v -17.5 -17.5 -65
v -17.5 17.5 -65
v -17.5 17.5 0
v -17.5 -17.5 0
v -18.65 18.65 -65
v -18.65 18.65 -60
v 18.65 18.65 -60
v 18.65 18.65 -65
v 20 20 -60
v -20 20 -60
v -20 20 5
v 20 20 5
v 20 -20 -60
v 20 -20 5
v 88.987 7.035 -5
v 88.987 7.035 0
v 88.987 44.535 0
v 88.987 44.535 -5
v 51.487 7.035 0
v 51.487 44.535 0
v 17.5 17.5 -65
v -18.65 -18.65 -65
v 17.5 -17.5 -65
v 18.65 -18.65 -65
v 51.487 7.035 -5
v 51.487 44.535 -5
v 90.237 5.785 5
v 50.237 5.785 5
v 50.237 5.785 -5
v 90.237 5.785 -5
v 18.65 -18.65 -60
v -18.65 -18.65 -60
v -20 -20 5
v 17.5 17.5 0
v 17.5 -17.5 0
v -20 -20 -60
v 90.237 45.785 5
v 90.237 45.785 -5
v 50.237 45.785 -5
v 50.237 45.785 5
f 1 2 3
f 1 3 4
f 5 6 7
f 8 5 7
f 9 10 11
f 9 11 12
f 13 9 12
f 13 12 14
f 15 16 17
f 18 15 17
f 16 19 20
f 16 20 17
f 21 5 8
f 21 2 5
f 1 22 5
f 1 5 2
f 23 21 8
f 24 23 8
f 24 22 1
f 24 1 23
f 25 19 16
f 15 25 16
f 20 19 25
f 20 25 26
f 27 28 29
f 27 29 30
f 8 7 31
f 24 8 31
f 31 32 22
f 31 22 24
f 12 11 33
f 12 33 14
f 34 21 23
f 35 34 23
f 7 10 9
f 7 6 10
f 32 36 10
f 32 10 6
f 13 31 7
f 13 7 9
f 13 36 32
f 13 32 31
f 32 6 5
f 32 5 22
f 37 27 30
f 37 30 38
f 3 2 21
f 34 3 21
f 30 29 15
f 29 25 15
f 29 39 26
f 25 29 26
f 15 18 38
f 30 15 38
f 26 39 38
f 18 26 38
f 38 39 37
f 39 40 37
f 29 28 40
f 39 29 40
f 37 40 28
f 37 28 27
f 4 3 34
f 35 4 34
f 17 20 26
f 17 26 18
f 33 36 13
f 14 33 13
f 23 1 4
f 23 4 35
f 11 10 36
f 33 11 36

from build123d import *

# Parameters (mm, degrees)
F0_W     = 40
F0_H     = 40
F1_DEPTH = 5
F2_W     = 40
F2_H     = 40
F2_W_2   = 35
F2_H_2   = 35
F3_DEPTH = 60
F4_W     = 37.3
F4_H     = 37.3
F4_W_2   = 35
F4_H_2   = 35
F5_DEPTH = 5
F6_W     = 40
F6_H     = 40
F6_W_2   = 37.5
F6_H_2   = 37.5
F7_DEPTH = 5
F8_DEPTH = 5


with BuildPart() as f1:
    # F0 (on Top) → F1 (new body)
    with BuildSketch(Plane.XY):
        Rectangle(F0_W, F0_H)
    extrude(amount=F1_DEPTH)

    # F2 (on face) → F3 (join)
    with BuildSketch(Plane(origin=(0, 0, 0), x_dir=(1, 0, 0), z_dir=(0, 0, -1))):
        Rectangle(F2_W, F2_H)
        Rectangle(F2_W_2, F2_H_2, mode=Mode.SUBTRACT)
    extrude(amount=F3_DEPTH)

    # F4 (on face) → F5 (join)
    with BuildSketch(Plane(origin=(0, 0, -60), x_dir=(1, 0, 0), z_dir=(0, 0, -1))):
        Rectangle(F4_W, F4_H)
        Rectangle(F4_W_2, F4_H_2, mode=Mode.SUBTRACT)
    extrude(amount=F5_DEPTH)


with BuildPart() as f7:
    # F6 (on Top) → F7 (new body)
    with BuildSketch(Plane.XY):
        with Locations((70.2371150255, 25.7852885835)):
            Rectangle(F6_W, F6_H)
        with Locations((70.2371150255, 25.7852885835)):
            Rectangle(F6_W_2, F6_H_2, mode=Mode.SUBTRACT)
        with Locations((70.2371150255, 25.7852885835)):
            Rectangle(F6_W_2, F6_H_2)
    extrude(amount=F7_DEPTH)

    # F6 (on Top) → F8 (join)
    with BuildSketch(Plane.XY):
        with Locations((70.2371150255, 25.7852885835)):
            Rectangle(F6_W, F6_H)
        with Locations((70.2371150255, 25.7852885835)):
            Rectangle(F6_W_2, F6_H_2, mode=Mode.SUBTRACT)
    extrude(amount=-F8_DEPTH)


solid = Compound([f1.part, f7.part])
